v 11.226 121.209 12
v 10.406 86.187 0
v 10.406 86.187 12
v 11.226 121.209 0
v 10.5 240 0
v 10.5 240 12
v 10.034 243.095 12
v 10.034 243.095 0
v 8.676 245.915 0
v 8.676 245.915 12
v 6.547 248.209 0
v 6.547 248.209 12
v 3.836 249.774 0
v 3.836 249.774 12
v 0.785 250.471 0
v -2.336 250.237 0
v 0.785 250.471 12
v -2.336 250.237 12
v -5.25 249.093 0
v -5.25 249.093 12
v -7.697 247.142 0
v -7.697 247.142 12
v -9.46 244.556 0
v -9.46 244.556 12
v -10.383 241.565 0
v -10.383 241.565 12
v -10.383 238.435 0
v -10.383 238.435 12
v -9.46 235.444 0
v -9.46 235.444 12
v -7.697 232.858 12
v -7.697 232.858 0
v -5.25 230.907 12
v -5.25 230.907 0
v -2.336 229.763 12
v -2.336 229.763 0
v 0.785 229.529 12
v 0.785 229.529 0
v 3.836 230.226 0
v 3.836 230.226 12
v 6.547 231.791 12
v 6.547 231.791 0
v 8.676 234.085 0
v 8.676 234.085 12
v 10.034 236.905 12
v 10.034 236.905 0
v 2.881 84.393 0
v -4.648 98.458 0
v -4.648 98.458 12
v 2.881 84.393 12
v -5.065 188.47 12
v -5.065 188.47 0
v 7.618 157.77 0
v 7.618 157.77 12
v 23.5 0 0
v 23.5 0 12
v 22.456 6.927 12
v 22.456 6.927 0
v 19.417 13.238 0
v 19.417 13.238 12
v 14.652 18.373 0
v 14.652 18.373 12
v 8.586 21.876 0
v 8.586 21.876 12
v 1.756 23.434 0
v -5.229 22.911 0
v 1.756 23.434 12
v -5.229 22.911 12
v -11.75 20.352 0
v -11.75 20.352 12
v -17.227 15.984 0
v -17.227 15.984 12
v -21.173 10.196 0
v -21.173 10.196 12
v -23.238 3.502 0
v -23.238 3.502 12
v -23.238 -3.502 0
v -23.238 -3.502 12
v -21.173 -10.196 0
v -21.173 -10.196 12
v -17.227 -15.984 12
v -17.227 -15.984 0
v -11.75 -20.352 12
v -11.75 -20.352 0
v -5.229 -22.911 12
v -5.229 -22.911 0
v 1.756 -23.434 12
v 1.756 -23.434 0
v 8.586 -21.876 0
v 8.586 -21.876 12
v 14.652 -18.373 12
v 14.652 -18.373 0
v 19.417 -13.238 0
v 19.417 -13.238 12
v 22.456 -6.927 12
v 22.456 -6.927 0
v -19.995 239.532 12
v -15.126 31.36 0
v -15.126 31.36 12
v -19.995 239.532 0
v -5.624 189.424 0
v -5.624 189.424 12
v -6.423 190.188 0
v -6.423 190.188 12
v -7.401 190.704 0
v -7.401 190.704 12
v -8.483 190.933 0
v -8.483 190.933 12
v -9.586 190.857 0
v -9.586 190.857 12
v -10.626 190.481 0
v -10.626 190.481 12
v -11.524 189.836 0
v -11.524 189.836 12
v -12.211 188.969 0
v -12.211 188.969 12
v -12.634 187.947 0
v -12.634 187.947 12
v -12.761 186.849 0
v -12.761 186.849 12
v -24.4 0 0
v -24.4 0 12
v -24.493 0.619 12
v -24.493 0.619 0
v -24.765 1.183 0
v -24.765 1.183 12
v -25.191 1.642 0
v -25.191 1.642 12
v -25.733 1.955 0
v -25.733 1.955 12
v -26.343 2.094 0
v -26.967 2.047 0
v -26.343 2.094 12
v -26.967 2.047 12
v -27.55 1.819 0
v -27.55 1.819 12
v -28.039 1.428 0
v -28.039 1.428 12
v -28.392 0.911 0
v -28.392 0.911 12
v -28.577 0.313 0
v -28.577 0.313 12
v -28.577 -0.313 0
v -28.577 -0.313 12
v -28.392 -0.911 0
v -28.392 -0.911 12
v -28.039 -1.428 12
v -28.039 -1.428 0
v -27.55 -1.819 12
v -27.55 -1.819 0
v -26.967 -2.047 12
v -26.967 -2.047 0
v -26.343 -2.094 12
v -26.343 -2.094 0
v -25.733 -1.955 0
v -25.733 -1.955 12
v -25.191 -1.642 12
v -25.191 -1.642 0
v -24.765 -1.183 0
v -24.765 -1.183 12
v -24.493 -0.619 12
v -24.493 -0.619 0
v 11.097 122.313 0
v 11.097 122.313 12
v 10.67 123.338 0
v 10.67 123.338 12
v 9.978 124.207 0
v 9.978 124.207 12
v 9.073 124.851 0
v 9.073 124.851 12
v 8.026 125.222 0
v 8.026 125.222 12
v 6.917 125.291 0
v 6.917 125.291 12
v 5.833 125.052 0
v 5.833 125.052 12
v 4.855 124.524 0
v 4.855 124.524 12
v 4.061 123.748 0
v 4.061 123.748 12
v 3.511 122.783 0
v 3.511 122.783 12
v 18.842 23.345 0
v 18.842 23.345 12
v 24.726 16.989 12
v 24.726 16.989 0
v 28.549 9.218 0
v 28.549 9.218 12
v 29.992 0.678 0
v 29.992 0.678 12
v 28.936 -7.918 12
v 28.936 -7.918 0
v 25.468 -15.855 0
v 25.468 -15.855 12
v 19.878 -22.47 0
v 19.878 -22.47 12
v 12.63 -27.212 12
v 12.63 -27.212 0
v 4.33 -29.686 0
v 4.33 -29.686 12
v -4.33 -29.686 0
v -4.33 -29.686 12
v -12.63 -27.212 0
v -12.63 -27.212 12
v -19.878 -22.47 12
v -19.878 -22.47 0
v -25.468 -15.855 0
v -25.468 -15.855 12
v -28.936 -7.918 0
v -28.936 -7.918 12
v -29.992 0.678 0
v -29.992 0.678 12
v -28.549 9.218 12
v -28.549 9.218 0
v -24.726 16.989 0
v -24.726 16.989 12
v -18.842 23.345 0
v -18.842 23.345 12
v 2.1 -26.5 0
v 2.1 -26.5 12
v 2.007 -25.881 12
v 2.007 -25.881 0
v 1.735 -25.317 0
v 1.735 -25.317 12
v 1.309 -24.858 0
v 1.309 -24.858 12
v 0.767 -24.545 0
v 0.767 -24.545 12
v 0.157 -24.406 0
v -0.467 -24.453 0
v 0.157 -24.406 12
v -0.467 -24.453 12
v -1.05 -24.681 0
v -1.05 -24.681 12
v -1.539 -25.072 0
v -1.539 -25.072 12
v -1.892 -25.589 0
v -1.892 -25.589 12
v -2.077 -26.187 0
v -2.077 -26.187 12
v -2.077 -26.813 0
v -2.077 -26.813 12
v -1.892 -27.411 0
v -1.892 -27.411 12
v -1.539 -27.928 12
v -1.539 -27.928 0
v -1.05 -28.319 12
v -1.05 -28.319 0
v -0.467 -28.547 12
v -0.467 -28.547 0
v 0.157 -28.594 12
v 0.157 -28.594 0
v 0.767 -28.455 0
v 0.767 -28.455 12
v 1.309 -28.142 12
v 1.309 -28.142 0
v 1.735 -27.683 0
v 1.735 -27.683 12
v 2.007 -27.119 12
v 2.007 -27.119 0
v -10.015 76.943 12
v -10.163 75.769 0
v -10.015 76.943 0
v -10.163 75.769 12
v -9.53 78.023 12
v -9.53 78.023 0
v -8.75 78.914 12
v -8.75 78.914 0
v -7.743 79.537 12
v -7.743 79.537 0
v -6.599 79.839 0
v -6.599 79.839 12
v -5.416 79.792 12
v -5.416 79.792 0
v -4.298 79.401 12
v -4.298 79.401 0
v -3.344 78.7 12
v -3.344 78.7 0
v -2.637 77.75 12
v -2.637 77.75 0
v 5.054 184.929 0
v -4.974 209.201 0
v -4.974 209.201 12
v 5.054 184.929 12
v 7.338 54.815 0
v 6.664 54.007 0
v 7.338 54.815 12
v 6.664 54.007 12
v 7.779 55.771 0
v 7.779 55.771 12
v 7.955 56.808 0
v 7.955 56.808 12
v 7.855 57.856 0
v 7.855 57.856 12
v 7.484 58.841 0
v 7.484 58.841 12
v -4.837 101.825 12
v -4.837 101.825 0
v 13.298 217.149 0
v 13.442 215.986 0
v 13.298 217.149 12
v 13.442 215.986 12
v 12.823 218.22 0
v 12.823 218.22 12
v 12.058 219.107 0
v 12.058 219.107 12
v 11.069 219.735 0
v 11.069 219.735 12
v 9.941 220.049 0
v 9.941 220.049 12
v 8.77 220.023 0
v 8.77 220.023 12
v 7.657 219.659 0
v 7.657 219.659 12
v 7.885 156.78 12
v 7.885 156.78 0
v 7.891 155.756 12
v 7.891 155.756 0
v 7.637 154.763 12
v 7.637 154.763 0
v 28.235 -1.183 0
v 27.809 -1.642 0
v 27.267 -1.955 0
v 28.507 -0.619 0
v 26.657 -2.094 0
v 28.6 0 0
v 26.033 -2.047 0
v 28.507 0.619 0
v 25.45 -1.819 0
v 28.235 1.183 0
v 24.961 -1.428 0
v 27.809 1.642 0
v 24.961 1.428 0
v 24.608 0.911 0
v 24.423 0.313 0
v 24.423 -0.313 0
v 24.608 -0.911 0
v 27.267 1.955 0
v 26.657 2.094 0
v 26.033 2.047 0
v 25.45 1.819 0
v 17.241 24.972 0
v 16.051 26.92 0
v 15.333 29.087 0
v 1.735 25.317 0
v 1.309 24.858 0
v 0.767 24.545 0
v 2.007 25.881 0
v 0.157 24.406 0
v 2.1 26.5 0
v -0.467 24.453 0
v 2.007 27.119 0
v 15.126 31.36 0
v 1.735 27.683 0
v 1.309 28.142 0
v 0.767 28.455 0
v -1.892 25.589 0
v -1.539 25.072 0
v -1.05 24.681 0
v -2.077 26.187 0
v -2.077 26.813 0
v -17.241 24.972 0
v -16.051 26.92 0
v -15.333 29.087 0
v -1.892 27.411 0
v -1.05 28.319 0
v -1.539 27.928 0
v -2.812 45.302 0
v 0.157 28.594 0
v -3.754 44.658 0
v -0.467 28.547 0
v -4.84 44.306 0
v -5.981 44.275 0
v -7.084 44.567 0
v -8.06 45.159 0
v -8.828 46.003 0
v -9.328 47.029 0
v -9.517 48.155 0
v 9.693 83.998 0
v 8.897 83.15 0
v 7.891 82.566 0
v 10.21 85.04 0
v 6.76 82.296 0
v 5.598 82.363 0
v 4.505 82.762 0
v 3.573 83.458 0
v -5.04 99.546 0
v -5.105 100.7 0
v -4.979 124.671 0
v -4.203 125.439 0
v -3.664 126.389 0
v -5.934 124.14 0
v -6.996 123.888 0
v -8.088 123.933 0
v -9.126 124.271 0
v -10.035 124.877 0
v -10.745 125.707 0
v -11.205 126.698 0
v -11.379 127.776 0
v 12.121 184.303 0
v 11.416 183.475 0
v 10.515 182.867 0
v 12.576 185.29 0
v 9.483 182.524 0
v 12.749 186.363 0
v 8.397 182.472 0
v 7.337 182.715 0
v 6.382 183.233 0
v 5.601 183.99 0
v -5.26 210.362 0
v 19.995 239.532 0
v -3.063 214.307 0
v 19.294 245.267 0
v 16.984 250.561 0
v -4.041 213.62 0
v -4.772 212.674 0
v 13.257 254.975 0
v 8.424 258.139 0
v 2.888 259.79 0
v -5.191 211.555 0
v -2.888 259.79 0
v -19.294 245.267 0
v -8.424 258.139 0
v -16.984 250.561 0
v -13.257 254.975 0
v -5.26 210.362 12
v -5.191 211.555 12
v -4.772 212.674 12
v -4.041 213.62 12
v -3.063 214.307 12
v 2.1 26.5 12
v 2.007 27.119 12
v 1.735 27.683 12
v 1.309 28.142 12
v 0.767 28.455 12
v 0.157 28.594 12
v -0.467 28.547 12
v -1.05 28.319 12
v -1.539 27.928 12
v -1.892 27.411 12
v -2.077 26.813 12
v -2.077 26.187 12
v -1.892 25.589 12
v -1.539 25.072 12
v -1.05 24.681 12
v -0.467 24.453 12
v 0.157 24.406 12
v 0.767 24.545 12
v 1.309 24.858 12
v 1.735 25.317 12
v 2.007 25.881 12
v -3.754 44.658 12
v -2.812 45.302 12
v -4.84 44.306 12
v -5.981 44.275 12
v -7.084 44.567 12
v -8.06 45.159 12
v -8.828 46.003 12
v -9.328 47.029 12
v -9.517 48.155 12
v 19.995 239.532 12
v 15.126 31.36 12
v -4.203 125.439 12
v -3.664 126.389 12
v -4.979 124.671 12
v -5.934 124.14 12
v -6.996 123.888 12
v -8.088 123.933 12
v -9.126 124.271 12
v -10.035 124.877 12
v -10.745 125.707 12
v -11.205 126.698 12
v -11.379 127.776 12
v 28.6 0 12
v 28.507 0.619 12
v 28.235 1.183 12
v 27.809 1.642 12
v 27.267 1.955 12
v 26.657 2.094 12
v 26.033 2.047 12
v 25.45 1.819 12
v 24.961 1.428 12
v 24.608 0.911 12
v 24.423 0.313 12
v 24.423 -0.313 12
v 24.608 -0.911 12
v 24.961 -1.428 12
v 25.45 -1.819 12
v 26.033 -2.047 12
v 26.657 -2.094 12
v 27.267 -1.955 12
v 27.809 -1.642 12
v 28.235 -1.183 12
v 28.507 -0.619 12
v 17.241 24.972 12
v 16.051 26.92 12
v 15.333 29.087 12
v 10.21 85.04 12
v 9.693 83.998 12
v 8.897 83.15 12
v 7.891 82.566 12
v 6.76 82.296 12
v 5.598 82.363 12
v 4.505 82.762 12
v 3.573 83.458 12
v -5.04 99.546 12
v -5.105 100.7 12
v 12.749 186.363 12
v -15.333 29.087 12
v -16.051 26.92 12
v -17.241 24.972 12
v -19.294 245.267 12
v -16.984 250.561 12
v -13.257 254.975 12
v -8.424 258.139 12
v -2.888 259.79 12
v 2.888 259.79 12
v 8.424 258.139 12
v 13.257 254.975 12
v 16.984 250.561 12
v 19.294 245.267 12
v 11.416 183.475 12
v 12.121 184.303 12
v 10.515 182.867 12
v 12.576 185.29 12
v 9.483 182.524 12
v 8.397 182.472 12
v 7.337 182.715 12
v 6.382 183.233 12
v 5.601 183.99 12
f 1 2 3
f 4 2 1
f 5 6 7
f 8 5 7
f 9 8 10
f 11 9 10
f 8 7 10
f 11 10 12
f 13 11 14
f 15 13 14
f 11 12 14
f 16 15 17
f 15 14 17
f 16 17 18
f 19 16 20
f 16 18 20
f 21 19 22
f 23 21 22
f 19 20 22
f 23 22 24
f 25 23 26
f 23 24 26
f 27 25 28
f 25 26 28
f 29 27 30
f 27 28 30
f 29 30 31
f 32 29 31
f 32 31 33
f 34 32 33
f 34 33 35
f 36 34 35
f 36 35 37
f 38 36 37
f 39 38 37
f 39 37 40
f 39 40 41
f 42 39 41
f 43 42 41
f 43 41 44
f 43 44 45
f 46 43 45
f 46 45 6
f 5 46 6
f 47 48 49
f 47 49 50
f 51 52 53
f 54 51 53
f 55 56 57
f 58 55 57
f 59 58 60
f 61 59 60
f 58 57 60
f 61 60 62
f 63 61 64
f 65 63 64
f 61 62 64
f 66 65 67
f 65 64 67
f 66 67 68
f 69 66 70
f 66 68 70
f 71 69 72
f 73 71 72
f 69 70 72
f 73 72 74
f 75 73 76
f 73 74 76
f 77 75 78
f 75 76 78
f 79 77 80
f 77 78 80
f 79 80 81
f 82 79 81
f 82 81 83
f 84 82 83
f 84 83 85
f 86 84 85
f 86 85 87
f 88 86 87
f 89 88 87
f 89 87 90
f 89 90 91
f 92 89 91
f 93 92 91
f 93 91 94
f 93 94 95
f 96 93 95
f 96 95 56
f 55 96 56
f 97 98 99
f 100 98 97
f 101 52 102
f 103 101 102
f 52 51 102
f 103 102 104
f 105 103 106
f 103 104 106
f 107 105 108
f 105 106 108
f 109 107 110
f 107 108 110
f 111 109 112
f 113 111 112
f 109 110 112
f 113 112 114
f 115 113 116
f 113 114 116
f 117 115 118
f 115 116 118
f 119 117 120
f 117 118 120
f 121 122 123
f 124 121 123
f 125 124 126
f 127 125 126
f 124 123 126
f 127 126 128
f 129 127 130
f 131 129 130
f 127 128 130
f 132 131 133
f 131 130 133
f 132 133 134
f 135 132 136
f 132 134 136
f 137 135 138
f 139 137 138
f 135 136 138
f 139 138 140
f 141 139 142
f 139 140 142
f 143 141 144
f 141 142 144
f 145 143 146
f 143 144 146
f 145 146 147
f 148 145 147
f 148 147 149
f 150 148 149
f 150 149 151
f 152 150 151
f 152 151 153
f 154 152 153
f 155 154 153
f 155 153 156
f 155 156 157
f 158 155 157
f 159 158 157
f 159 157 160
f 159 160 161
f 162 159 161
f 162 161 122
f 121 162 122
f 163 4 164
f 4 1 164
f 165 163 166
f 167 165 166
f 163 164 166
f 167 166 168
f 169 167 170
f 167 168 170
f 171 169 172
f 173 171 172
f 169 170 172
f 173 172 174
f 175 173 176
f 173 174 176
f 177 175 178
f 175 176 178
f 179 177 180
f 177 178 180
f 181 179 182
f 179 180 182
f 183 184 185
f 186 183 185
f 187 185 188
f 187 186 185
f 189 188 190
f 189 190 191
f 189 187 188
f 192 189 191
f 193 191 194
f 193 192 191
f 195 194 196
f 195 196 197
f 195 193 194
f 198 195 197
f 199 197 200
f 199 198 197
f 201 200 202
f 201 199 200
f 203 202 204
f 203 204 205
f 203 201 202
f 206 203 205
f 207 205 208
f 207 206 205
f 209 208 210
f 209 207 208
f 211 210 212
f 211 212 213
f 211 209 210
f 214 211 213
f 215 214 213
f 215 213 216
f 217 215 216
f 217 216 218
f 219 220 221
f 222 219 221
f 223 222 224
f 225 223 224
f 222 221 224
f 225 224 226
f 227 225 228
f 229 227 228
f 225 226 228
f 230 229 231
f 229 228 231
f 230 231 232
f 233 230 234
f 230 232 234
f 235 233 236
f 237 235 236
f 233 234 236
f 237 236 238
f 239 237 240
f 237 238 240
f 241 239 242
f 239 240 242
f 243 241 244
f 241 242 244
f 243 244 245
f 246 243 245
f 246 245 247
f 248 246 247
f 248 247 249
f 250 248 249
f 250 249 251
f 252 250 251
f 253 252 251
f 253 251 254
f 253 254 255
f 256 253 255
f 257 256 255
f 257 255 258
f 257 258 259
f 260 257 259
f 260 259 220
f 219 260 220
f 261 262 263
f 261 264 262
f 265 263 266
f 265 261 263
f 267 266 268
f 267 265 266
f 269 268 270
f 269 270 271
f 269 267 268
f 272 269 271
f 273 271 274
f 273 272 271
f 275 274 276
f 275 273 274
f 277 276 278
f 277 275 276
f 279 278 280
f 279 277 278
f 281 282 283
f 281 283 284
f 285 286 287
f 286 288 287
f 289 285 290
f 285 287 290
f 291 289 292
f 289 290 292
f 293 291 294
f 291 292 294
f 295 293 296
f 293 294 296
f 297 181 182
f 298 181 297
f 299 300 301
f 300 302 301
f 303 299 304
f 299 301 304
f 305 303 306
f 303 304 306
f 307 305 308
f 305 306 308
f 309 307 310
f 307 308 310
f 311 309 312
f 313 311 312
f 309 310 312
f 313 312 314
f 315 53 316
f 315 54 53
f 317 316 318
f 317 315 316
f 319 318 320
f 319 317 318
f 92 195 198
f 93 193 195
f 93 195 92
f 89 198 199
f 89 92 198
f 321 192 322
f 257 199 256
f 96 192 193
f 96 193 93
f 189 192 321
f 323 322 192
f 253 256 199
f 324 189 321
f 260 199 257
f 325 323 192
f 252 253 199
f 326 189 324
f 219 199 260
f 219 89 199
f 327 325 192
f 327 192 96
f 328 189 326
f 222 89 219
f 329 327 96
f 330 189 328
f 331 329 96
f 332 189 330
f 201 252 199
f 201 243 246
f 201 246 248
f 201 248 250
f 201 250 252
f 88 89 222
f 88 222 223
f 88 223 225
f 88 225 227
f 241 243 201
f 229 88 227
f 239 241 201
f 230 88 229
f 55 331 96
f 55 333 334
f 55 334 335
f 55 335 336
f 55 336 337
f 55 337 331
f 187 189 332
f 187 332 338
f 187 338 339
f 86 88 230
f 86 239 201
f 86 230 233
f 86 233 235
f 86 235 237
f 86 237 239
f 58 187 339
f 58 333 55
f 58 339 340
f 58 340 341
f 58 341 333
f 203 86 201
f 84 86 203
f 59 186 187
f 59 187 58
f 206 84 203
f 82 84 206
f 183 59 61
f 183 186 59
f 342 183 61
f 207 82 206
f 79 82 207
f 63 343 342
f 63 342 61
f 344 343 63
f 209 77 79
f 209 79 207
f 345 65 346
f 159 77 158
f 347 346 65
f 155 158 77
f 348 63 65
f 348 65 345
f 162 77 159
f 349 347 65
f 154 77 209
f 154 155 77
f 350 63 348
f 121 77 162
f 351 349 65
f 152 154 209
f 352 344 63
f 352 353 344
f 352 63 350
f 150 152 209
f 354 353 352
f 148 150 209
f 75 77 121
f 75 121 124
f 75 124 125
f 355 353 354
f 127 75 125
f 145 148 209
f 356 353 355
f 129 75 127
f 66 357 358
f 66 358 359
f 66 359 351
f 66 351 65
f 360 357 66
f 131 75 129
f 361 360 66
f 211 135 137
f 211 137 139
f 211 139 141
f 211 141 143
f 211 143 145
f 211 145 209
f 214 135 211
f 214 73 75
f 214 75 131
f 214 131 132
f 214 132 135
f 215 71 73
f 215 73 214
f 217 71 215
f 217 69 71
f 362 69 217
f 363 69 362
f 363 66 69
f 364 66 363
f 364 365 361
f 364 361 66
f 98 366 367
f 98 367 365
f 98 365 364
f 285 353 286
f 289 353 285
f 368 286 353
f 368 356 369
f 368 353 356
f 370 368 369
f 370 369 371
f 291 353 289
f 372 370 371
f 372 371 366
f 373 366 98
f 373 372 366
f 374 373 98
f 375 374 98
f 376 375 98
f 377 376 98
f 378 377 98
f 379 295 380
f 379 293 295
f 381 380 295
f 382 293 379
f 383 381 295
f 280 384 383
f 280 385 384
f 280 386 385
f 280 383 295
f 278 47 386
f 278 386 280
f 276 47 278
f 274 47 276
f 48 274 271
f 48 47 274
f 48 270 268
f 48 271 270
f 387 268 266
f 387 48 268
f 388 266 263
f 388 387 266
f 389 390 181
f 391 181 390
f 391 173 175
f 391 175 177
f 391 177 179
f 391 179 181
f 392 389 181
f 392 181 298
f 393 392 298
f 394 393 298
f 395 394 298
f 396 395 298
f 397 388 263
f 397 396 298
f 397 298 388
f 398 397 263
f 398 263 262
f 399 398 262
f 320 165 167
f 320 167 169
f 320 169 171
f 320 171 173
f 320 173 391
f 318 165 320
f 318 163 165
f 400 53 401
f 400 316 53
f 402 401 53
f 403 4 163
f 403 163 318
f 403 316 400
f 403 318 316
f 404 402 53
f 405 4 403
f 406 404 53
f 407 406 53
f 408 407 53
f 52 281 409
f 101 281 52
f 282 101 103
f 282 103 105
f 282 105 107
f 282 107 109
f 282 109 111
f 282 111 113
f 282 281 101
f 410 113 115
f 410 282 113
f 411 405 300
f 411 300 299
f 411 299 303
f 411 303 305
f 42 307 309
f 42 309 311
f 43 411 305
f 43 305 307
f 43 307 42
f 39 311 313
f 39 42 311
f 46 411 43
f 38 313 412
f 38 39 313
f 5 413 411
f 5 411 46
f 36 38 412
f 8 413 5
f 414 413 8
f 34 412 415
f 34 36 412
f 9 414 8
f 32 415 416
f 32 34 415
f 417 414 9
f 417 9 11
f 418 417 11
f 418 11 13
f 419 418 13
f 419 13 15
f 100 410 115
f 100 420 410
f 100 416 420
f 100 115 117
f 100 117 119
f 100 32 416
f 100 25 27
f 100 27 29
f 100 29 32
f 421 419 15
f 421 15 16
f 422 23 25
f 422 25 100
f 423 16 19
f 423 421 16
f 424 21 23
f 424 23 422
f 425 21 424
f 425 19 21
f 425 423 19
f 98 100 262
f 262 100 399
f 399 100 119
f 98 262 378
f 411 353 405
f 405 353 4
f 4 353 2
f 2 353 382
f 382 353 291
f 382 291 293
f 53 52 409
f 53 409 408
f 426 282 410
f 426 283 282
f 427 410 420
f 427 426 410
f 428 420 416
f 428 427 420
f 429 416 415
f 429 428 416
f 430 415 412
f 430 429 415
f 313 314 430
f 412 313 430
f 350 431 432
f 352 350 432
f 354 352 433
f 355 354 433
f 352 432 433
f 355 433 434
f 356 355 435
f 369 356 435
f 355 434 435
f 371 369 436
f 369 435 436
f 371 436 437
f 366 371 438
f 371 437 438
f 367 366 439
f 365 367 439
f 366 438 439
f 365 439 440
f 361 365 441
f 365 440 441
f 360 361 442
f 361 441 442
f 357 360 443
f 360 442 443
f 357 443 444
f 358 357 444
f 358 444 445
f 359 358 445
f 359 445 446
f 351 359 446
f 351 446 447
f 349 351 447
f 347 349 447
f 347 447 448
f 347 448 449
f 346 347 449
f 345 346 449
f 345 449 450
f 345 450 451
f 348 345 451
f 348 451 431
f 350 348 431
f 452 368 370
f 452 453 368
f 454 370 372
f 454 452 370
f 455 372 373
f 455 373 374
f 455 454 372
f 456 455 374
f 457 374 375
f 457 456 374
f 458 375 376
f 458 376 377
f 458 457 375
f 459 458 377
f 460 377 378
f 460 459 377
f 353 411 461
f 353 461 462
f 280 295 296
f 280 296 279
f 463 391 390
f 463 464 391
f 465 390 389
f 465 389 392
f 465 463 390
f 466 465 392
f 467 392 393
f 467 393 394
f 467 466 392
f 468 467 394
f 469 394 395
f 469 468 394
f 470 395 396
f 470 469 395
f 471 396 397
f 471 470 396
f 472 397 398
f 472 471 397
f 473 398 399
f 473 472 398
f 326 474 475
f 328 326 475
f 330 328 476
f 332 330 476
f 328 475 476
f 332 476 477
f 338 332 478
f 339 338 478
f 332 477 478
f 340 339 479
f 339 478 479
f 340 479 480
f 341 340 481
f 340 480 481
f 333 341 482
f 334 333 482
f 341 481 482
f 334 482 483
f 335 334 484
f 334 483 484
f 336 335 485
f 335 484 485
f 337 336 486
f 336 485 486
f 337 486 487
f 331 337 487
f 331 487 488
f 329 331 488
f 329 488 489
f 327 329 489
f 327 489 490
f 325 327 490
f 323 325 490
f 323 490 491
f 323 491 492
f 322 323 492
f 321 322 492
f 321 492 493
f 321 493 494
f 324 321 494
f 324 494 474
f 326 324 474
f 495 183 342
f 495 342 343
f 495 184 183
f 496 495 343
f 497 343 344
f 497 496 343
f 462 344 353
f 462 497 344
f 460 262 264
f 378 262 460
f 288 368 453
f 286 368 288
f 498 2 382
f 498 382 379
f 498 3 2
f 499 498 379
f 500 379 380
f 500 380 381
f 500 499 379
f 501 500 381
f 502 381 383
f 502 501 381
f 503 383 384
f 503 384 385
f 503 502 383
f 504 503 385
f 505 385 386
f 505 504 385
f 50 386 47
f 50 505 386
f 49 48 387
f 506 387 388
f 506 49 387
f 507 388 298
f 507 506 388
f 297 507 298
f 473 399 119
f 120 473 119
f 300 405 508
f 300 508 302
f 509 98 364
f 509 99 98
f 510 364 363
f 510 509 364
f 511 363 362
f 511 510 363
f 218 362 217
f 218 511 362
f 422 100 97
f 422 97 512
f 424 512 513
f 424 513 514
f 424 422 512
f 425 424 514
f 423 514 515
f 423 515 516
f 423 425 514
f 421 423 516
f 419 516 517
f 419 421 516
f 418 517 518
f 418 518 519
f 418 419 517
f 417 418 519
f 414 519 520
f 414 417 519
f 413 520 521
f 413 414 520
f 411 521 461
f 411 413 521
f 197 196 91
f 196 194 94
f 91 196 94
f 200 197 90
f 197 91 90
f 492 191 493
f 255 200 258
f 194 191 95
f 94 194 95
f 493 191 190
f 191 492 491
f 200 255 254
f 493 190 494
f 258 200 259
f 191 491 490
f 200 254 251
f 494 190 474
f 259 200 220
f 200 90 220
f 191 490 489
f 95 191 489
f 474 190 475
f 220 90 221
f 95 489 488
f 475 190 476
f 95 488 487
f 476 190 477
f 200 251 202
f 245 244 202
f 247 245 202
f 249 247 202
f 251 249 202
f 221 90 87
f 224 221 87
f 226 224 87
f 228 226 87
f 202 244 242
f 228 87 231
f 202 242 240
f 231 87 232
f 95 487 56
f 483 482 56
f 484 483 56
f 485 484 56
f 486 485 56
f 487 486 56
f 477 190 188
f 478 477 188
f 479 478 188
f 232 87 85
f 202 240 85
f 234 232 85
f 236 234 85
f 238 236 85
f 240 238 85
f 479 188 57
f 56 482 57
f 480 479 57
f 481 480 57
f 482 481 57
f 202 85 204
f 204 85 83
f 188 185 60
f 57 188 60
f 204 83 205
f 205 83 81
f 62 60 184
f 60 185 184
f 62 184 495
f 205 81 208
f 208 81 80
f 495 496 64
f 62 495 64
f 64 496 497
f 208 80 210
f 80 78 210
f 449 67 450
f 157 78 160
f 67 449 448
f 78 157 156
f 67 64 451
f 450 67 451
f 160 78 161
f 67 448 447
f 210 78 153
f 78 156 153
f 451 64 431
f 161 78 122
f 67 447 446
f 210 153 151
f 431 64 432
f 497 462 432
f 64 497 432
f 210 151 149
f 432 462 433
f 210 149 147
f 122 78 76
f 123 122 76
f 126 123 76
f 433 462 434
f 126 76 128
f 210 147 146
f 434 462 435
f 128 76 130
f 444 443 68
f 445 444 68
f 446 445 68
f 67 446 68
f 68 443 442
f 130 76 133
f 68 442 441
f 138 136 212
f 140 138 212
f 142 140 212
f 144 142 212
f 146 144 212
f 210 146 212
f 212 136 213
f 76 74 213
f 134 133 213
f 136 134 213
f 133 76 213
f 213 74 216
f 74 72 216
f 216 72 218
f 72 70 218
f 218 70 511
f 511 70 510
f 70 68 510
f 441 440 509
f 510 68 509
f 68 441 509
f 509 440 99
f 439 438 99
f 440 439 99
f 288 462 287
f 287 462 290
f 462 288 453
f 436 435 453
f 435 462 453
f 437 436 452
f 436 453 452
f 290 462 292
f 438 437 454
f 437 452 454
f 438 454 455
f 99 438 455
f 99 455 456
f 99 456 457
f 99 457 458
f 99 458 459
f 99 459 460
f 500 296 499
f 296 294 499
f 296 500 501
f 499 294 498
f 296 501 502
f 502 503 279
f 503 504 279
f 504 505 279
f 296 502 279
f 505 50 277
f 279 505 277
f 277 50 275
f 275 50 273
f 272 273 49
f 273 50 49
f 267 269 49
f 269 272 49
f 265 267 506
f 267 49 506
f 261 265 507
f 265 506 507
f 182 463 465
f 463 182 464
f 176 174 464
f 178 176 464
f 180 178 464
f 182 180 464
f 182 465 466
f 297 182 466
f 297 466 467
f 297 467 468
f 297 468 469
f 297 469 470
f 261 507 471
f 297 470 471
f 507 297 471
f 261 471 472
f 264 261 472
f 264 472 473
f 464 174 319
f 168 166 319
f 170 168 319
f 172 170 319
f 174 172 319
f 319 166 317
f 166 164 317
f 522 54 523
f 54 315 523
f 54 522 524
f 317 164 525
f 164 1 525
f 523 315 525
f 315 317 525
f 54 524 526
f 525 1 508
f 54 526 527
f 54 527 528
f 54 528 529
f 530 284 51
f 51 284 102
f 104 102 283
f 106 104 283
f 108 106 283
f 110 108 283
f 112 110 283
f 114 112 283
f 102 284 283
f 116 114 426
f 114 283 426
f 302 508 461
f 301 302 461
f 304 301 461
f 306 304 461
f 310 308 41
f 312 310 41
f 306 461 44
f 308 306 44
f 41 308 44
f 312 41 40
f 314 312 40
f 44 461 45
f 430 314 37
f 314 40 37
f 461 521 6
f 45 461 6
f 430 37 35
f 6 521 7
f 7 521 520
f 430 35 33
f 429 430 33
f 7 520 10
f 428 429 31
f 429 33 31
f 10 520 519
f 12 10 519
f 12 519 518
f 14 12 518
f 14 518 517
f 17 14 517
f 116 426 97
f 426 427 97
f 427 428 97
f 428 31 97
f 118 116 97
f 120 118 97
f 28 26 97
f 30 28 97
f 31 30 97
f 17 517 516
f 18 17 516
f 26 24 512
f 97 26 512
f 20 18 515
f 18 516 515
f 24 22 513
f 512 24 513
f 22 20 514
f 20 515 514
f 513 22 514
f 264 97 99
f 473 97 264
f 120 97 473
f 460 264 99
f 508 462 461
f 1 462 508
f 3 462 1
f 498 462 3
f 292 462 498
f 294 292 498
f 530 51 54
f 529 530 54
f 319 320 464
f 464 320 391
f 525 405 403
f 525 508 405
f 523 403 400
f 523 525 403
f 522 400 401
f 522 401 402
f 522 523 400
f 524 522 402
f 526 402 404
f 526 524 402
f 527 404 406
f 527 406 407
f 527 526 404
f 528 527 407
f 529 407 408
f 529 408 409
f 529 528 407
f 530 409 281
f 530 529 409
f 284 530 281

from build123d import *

# Parameters (mm, degrees)
EXTRUDE_1_DEPTH     = 12
SKETCH_2_R          = 10.5
SKETCH_2_R_2        = 23.5
CUT_EXTRUDE_1_DEPTH = 39
FILLET_1_R          = 10
SKETCH_3_R          = 2.1
CUT_EXTRUDE_2_DEPTH = 68
CUT_EXTRUDE_3_DEPTH = 263
FILLET_3_R          = 4


with BuildPart() as part:
    # 草图1 → 凸台-拉伸1 (new body)
    with BuildSketch(Plane.XY):
        with BuildLine():
            Line((-15, 25.980762114), (-19.994532285, 239.532369068))
            ThreePointArc((-19.994532285, 239.532369068), (0, 260), (19.994532285, 239.532369068))
            Line((19.994532285, 239.532369068), (15, 25.980762114))
            ThreePointArc((15, 25.980762114), (0, -30), (-15, 25.980762114))
        make_face()
    extrude(amount=EXTRUDE_1_DEPTH)

    # 草图2 → 切除-拉伸1 (cut)
    with BuildSketch(Plane.XY.offset(12)):
        with Locations((0, 240)):
            Circle(SKETCH_2_R)
        Circle(SKETCH_2_R_2)
    extrude(amount=-CUT_EXTRUDE_1_DEPTH, mode=Mode.SUBTRACT)

    # 圆角1
    fillet_1_edges = [part.edges().sort_by_distance(p)[0] for p in [
        (15, 25.980762114, 6),
        (-15, 25.980762114, 6),
    ]]
    fillet(fillet_1_edges, radius=FILLET_1_R)

    # 草图3 → 切除-拉伸2 (cut)
    with BuildSketch(Plane.XY.offset(12)):
        with Locations((0, 26.5)):
            Circle(SKETCH_3_R)
        with Locations((26.5, 0)):
            Circle(SKETCH_3_R)
        with Locations((0, -26.5)):
            Circle(SKETCH_3_R)
        with Locations((-26.5, 0)):
            Circle(SKETCH_3_R)
    extrude(amount=-CUT_EXTRUDE_2_DEPTH, mode=Mode.SUBTRACT)

    # 草图6 → 切除-拉伸3 (cut, through all)
    with BuildSketch(Plane(origin=(0, 0, 0), x_dir=(-1, 0, 0), z_dir=(0, 0, -1))):
        Polygon((-13.597448285, 222.62437169), (6.396098914, 212.643766677), (-12.305308581, 167.376253439), align=None)
        Polygon((13.262733731, 208.312955361), (-8.237709541, 156.270262815), (10.920628657, 108.171385833), align=None)
        Polygon((-11.745923389, 143.458577117), (5.525281493, 100.097532419), (-10.051201509, 70.997221333), align=None)
        Polygon((-8.948192405, 56.105719255), (10.555093379, 92.542165366), (9.310631693, 39.332619917), align=None)
    extrude(amount=-CUT_EXTRUDE_3_DEPTH, mode=Mode.SUBTRACT)

    # 圆角3
    fillet_3_edges = [part.edges().sort_by_distance(p)[0] for p in [
        (10.051201509, 70.997221333, 6),
        (11.745923389, 143.458577117, 6),
        (-5.525281493, 100.097532419, 6),
        (-13.262733731, 208.312955361, 6),
        (-10.920628657, 108.171385833, 6),
        (8.237709541, 156.270262815, 6),
        (-9.310631693, 39.332619917, 6),
        (8.948192405, 56.105719255, 6),
        (-10.555093379, 92.542165366, 6),
        (12.305308581, 167.376253439, 6),
        (13.597448285, 222.62437169, 6),
        (-6.396098914, 212.643766677, 6),
    ]]
    fillet(fillet_3_edges, radius=FILLET_3_R)


solid = part.part
